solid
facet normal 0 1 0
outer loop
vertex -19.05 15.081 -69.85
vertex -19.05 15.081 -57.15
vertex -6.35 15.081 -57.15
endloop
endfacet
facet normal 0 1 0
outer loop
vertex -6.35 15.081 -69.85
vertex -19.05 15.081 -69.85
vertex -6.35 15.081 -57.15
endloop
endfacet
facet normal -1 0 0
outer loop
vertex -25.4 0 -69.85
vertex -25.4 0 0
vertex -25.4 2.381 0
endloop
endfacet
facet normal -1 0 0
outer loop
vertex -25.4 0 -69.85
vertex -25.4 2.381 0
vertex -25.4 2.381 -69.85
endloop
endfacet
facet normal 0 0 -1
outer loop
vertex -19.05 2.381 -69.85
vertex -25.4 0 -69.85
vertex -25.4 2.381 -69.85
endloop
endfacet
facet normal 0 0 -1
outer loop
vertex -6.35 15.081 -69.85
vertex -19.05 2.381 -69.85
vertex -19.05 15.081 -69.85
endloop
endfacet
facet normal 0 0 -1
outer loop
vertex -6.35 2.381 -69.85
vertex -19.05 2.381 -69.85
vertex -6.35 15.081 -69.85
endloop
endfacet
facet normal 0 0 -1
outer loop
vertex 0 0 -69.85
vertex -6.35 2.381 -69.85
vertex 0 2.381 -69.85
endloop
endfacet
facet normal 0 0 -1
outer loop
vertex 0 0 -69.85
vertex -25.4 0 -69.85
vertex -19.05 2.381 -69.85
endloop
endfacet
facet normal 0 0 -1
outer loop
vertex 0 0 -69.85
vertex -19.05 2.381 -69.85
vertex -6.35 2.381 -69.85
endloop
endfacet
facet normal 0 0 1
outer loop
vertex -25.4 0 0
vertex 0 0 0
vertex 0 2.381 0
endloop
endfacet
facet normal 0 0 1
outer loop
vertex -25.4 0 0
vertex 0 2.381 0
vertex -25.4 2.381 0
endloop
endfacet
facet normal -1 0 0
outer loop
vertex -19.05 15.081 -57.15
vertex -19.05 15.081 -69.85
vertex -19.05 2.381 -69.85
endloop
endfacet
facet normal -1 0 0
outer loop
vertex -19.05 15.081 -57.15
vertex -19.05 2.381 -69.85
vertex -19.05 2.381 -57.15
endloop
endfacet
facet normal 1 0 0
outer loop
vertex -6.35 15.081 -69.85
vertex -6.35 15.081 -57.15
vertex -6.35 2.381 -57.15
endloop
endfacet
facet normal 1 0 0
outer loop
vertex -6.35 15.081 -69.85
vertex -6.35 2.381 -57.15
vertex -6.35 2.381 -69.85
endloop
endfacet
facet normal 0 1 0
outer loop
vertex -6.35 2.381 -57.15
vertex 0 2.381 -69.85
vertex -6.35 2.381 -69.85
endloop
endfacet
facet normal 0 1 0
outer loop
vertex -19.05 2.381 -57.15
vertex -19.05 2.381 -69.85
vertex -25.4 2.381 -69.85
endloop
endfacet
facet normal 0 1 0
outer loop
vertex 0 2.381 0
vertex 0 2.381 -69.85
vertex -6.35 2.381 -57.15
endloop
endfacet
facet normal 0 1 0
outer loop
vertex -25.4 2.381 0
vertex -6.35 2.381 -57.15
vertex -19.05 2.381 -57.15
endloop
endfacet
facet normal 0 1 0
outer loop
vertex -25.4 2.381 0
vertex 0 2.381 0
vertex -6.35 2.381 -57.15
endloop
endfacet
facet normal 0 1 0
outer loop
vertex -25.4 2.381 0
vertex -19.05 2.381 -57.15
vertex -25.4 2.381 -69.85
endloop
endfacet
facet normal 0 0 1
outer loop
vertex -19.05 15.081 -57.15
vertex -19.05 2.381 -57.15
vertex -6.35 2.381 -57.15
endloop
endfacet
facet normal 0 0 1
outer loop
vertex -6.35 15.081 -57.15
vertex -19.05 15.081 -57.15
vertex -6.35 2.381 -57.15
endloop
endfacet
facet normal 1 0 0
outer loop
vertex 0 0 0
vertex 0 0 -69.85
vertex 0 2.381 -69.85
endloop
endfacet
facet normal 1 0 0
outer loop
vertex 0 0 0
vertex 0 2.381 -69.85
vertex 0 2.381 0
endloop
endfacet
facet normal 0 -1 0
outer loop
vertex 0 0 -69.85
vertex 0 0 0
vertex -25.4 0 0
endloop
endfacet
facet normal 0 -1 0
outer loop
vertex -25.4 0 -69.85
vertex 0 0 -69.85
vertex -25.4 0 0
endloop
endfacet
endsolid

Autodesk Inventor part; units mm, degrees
ref_plane "YZ Plane" through (0, 0, 0) normal (1, 0, 0) x (0, 1, 0)
ref_plane "XZ Plane" through (0, 0, 0) normal (0, 1, 0) x (-1, 0, 0)
ref_plane "XY Plane" through (0, 0, 0) normal (0, 0, 1) x (1, 0, 0)
sketch "Sketch1" plane through (0, 0, 0) normal (0, 1, 0) x (-1, 0, 0)
  line L0 (0, 0) -> (25.4, 0)
  line L1 (25.4, 0) -> (25.4, -69.85)
  line L2 (25.4, -69.85) -> (0, -69.85)
  line L3 (0, -69.85) -> (0, 0)
  dimension "d0" = 25.4
  dimension "d1" = 69.85
extrude "Extrusion1" add sketch "Sketch1" along normal blind 2.3813
sketch "Sketch2" plane through (0, 2.3813, 0) normal (0, 1, 0) x (1, 0, 0)
  line L0 (0, 69.85) -> (-25.4, 69.85) projected
  line L1 (0, 69.85) -> (-6.35, 69.85)
  line L2 (-6.35, 69.85) -> (-19.05, 69.85)
  line L3 (-19.05, 69.85) -> (-19.05, 57.15)
  line L4 (-19.05, 57.15) -> (-6.35, 57.15)
  line L5 (-6.35, 57.15) -> (-6.35, 69.85)
  point P0 (0, 0)
  dimension "d4" = 6.35
  dimension "d5" = 12.7
  dimension "d6" = 12.7
extrude "Extrusion2" add sketch "Sketch2" along normal blind 12.7
properties part number "WaterSensor"
